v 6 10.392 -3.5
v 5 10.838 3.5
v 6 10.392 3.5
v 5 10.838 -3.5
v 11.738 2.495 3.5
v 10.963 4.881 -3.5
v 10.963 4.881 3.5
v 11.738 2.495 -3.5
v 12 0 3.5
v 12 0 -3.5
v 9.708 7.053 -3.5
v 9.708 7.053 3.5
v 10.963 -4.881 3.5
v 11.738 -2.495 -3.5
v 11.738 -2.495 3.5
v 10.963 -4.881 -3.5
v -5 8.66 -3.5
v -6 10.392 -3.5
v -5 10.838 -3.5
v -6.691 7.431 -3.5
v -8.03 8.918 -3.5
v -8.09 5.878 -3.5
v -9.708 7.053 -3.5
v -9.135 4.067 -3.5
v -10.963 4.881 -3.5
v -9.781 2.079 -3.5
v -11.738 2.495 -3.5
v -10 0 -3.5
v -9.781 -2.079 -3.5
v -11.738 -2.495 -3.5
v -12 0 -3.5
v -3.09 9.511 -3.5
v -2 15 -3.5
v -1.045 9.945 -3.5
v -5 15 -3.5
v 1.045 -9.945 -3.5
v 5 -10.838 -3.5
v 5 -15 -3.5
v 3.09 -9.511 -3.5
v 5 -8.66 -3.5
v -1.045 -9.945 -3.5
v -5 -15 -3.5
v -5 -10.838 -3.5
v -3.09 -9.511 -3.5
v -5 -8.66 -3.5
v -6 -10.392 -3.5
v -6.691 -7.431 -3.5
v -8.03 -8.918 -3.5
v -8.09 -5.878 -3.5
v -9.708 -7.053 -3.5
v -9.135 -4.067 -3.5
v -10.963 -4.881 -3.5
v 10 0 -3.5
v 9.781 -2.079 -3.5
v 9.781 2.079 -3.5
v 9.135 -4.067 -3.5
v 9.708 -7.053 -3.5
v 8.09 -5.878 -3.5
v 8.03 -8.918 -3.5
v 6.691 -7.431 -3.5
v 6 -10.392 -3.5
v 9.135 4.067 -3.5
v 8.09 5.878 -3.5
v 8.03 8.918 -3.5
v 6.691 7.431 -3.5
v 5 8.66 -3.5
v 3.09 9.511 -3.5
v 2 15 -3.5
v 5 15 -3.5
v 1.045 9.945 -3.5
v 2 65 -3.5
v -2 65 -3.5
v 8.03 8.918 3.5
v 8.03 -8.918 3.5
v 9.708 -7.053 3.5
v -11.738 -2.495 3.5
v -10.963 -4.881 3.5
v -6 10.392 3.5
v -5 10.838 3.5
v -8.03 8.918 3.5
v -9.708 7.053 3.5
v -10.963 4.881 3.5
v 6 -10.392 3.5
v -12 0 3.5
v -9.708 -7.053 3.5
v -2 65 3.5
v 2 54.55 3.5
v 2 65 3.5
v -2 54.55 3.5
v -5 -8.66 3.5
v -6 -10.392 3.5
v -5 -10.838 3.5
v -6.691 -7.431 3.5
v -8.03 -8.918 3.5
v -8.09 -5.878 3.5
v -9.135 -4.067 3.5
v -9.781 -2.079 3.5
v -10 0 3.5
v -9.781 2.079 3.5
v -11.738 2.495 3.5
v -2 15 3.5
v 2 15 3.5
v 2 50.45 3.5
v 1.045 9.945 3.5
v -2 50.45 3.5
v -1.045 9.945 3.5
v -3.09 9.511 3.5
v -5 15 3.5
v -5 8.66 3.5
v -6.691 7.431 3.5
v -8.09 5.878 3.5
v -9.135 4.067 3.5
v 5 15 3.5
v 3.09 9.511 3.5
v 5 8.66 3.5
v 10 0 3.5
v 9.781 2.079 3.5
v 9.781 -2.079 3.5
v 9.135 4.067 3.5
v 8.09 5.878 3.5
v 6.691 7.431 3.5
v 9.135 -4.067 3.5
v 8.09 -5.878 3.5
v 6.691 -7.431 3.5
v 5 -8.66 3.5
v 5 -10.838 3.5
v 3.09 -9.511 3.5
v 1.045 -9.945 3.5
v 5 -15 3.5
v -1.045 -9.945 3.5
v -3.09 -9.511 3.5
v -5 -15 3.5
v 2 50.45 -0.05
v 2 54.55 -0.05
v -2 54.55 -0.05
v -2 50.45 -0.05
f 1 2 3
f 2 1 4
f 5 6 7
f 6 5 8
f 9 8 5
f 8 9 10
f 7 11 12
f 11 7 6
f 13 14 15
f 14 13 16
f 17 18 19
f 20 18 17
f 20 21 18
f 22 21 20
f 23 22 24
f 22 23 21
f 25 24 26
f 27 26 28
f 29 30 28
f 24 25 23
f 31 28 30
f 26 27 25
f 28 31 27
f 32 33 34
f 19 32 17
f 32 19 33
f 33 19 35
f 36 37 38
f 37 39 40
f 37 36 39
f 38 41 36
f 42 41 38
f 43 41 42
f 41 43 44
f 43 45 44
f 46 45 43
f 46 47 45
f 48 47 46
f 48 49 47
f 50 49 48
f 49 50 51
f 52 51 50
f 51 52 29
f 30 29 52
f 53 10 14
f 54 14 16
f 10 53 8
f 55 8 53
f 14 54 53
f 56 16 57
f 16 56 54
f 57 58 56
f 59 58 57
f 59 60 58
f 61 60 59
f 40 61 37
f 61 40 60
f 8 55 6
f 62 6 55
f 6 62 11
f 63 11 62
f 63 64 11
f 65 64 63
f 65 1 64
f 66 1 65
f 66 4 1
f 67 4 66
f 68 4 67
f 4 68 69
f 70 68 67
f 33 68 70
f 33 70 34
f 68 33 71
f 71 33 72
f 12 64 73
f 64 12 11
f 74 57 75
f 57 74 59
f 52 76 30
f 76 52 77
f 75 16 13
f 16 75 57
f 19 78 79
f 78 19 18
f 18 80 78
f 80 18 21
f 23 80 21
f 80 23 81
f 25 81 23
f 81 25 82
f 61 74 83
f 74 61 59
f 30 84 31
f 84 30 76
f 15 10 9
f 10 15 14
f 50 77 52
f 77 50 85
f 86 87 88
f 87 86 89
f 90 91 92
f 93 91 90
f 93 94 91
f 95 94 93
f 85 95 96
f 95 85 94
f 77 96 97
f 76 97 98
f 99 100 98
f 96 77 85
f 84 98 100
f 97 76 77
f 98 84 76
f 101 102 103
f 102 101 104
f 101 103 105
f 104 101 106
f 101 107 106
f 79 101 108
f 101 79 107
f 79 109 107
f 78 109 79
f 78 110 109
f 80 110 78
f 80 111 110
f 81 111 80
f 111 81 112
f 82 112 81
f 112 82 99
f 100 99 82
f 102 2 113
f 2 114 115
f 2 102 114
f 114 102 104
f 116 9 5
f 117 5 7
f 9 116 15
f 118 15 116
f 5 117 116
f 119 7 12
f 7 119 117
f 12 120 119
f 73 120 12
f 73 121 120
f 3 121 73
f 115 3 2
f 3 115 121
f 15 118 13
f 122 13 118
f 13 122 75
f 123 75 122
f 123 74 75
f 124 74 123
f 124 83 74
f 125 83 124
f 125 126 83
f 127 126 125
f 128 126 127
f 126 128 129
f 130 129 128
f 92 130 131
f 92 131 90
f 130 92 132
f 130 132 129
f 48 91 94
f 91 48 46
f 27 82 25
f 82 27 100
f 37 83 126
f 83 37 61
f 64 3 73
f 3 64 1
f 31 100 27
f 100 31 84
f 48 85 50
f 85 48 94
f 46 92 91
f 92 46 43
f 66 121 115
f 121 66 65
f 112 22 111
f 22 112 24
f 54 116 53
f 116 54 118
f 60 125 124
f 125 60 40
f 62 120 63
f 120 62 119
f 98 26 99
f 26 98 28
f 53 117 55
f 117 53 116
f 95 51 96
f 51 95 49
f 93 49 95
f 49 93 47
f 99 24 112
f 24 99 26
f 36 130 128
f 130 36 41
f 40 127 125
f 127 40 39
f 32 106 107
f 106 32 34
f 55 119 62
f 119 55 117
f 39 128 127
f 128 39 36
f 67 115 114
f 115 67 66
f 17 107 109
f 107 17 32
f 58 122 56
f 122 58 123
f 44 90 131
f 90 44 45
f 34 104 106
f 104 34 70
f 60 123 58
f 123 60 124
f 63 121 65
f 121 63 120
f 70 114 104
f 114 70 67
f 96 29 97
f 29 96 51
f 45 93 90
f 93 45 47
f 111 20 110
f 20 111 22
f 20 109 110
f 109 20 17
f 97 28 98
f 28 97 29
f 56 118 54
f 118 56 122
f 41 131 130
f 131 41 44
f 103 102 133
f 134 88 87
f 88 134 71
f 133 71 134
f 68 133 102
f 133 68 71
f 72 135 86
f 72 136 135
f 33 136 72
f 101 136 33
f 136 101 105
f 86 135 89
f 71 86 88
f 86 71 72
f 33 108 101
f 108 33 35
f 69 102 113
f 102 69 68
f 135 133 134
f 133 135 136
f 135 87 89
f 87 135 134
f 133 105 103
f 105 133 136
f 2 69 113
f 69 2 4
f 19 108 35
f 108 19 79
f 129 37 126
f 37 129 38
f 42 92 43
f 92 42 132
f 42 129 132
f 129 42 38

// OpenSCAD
module bracket_ring()
{
    INNER_RADIUS=10;
    THICKNESS=4;
    THICKNESS_ARM=10;
    HEIGHT=7;
    ARM_LENGTH1=5;
    ARM_LENGTH2=5;
    ARM_LENGTH3=50;//Protrusion
    difference(){
        cylinder(r=INNER_RADIUS+THICKNESS/2,h=HEIGHT,center=true);
        cylinder(r=INNER_RADIUS,h=HEIGHT+0.1,center=true);
    }
    translate([0,INNER_RADIUS+ARM_LENGTH1/2,0])cube([THICKNESS_ARM,ARM_LENGTH1,HEIGHT],center=true);
    translate([0,-INNER_RADIUS-ARM_LENGTH2/2,0])cube([THICKNESS_ARM,ARM_LENGTH2,HEIGHT],center=true);
    difference(){
    translate([0,INNER_RADIUS+ARM_LENGTH1+ARM_LENGTH3/2,0])cube([THICKNESS,ARM_LENGTH3,HEIGHT],center=true);
    translate([0,INNER_RADIUS+ARM_LENGTH1+ARM_LENGTH3/2+ARM_LENGTH3/4,HEIGHT/4])cube([THICKNESS+0.1,THICKNESS+0.1,HEIGHT/2+0.1],center=true);
    }
}
bracket_ring();
